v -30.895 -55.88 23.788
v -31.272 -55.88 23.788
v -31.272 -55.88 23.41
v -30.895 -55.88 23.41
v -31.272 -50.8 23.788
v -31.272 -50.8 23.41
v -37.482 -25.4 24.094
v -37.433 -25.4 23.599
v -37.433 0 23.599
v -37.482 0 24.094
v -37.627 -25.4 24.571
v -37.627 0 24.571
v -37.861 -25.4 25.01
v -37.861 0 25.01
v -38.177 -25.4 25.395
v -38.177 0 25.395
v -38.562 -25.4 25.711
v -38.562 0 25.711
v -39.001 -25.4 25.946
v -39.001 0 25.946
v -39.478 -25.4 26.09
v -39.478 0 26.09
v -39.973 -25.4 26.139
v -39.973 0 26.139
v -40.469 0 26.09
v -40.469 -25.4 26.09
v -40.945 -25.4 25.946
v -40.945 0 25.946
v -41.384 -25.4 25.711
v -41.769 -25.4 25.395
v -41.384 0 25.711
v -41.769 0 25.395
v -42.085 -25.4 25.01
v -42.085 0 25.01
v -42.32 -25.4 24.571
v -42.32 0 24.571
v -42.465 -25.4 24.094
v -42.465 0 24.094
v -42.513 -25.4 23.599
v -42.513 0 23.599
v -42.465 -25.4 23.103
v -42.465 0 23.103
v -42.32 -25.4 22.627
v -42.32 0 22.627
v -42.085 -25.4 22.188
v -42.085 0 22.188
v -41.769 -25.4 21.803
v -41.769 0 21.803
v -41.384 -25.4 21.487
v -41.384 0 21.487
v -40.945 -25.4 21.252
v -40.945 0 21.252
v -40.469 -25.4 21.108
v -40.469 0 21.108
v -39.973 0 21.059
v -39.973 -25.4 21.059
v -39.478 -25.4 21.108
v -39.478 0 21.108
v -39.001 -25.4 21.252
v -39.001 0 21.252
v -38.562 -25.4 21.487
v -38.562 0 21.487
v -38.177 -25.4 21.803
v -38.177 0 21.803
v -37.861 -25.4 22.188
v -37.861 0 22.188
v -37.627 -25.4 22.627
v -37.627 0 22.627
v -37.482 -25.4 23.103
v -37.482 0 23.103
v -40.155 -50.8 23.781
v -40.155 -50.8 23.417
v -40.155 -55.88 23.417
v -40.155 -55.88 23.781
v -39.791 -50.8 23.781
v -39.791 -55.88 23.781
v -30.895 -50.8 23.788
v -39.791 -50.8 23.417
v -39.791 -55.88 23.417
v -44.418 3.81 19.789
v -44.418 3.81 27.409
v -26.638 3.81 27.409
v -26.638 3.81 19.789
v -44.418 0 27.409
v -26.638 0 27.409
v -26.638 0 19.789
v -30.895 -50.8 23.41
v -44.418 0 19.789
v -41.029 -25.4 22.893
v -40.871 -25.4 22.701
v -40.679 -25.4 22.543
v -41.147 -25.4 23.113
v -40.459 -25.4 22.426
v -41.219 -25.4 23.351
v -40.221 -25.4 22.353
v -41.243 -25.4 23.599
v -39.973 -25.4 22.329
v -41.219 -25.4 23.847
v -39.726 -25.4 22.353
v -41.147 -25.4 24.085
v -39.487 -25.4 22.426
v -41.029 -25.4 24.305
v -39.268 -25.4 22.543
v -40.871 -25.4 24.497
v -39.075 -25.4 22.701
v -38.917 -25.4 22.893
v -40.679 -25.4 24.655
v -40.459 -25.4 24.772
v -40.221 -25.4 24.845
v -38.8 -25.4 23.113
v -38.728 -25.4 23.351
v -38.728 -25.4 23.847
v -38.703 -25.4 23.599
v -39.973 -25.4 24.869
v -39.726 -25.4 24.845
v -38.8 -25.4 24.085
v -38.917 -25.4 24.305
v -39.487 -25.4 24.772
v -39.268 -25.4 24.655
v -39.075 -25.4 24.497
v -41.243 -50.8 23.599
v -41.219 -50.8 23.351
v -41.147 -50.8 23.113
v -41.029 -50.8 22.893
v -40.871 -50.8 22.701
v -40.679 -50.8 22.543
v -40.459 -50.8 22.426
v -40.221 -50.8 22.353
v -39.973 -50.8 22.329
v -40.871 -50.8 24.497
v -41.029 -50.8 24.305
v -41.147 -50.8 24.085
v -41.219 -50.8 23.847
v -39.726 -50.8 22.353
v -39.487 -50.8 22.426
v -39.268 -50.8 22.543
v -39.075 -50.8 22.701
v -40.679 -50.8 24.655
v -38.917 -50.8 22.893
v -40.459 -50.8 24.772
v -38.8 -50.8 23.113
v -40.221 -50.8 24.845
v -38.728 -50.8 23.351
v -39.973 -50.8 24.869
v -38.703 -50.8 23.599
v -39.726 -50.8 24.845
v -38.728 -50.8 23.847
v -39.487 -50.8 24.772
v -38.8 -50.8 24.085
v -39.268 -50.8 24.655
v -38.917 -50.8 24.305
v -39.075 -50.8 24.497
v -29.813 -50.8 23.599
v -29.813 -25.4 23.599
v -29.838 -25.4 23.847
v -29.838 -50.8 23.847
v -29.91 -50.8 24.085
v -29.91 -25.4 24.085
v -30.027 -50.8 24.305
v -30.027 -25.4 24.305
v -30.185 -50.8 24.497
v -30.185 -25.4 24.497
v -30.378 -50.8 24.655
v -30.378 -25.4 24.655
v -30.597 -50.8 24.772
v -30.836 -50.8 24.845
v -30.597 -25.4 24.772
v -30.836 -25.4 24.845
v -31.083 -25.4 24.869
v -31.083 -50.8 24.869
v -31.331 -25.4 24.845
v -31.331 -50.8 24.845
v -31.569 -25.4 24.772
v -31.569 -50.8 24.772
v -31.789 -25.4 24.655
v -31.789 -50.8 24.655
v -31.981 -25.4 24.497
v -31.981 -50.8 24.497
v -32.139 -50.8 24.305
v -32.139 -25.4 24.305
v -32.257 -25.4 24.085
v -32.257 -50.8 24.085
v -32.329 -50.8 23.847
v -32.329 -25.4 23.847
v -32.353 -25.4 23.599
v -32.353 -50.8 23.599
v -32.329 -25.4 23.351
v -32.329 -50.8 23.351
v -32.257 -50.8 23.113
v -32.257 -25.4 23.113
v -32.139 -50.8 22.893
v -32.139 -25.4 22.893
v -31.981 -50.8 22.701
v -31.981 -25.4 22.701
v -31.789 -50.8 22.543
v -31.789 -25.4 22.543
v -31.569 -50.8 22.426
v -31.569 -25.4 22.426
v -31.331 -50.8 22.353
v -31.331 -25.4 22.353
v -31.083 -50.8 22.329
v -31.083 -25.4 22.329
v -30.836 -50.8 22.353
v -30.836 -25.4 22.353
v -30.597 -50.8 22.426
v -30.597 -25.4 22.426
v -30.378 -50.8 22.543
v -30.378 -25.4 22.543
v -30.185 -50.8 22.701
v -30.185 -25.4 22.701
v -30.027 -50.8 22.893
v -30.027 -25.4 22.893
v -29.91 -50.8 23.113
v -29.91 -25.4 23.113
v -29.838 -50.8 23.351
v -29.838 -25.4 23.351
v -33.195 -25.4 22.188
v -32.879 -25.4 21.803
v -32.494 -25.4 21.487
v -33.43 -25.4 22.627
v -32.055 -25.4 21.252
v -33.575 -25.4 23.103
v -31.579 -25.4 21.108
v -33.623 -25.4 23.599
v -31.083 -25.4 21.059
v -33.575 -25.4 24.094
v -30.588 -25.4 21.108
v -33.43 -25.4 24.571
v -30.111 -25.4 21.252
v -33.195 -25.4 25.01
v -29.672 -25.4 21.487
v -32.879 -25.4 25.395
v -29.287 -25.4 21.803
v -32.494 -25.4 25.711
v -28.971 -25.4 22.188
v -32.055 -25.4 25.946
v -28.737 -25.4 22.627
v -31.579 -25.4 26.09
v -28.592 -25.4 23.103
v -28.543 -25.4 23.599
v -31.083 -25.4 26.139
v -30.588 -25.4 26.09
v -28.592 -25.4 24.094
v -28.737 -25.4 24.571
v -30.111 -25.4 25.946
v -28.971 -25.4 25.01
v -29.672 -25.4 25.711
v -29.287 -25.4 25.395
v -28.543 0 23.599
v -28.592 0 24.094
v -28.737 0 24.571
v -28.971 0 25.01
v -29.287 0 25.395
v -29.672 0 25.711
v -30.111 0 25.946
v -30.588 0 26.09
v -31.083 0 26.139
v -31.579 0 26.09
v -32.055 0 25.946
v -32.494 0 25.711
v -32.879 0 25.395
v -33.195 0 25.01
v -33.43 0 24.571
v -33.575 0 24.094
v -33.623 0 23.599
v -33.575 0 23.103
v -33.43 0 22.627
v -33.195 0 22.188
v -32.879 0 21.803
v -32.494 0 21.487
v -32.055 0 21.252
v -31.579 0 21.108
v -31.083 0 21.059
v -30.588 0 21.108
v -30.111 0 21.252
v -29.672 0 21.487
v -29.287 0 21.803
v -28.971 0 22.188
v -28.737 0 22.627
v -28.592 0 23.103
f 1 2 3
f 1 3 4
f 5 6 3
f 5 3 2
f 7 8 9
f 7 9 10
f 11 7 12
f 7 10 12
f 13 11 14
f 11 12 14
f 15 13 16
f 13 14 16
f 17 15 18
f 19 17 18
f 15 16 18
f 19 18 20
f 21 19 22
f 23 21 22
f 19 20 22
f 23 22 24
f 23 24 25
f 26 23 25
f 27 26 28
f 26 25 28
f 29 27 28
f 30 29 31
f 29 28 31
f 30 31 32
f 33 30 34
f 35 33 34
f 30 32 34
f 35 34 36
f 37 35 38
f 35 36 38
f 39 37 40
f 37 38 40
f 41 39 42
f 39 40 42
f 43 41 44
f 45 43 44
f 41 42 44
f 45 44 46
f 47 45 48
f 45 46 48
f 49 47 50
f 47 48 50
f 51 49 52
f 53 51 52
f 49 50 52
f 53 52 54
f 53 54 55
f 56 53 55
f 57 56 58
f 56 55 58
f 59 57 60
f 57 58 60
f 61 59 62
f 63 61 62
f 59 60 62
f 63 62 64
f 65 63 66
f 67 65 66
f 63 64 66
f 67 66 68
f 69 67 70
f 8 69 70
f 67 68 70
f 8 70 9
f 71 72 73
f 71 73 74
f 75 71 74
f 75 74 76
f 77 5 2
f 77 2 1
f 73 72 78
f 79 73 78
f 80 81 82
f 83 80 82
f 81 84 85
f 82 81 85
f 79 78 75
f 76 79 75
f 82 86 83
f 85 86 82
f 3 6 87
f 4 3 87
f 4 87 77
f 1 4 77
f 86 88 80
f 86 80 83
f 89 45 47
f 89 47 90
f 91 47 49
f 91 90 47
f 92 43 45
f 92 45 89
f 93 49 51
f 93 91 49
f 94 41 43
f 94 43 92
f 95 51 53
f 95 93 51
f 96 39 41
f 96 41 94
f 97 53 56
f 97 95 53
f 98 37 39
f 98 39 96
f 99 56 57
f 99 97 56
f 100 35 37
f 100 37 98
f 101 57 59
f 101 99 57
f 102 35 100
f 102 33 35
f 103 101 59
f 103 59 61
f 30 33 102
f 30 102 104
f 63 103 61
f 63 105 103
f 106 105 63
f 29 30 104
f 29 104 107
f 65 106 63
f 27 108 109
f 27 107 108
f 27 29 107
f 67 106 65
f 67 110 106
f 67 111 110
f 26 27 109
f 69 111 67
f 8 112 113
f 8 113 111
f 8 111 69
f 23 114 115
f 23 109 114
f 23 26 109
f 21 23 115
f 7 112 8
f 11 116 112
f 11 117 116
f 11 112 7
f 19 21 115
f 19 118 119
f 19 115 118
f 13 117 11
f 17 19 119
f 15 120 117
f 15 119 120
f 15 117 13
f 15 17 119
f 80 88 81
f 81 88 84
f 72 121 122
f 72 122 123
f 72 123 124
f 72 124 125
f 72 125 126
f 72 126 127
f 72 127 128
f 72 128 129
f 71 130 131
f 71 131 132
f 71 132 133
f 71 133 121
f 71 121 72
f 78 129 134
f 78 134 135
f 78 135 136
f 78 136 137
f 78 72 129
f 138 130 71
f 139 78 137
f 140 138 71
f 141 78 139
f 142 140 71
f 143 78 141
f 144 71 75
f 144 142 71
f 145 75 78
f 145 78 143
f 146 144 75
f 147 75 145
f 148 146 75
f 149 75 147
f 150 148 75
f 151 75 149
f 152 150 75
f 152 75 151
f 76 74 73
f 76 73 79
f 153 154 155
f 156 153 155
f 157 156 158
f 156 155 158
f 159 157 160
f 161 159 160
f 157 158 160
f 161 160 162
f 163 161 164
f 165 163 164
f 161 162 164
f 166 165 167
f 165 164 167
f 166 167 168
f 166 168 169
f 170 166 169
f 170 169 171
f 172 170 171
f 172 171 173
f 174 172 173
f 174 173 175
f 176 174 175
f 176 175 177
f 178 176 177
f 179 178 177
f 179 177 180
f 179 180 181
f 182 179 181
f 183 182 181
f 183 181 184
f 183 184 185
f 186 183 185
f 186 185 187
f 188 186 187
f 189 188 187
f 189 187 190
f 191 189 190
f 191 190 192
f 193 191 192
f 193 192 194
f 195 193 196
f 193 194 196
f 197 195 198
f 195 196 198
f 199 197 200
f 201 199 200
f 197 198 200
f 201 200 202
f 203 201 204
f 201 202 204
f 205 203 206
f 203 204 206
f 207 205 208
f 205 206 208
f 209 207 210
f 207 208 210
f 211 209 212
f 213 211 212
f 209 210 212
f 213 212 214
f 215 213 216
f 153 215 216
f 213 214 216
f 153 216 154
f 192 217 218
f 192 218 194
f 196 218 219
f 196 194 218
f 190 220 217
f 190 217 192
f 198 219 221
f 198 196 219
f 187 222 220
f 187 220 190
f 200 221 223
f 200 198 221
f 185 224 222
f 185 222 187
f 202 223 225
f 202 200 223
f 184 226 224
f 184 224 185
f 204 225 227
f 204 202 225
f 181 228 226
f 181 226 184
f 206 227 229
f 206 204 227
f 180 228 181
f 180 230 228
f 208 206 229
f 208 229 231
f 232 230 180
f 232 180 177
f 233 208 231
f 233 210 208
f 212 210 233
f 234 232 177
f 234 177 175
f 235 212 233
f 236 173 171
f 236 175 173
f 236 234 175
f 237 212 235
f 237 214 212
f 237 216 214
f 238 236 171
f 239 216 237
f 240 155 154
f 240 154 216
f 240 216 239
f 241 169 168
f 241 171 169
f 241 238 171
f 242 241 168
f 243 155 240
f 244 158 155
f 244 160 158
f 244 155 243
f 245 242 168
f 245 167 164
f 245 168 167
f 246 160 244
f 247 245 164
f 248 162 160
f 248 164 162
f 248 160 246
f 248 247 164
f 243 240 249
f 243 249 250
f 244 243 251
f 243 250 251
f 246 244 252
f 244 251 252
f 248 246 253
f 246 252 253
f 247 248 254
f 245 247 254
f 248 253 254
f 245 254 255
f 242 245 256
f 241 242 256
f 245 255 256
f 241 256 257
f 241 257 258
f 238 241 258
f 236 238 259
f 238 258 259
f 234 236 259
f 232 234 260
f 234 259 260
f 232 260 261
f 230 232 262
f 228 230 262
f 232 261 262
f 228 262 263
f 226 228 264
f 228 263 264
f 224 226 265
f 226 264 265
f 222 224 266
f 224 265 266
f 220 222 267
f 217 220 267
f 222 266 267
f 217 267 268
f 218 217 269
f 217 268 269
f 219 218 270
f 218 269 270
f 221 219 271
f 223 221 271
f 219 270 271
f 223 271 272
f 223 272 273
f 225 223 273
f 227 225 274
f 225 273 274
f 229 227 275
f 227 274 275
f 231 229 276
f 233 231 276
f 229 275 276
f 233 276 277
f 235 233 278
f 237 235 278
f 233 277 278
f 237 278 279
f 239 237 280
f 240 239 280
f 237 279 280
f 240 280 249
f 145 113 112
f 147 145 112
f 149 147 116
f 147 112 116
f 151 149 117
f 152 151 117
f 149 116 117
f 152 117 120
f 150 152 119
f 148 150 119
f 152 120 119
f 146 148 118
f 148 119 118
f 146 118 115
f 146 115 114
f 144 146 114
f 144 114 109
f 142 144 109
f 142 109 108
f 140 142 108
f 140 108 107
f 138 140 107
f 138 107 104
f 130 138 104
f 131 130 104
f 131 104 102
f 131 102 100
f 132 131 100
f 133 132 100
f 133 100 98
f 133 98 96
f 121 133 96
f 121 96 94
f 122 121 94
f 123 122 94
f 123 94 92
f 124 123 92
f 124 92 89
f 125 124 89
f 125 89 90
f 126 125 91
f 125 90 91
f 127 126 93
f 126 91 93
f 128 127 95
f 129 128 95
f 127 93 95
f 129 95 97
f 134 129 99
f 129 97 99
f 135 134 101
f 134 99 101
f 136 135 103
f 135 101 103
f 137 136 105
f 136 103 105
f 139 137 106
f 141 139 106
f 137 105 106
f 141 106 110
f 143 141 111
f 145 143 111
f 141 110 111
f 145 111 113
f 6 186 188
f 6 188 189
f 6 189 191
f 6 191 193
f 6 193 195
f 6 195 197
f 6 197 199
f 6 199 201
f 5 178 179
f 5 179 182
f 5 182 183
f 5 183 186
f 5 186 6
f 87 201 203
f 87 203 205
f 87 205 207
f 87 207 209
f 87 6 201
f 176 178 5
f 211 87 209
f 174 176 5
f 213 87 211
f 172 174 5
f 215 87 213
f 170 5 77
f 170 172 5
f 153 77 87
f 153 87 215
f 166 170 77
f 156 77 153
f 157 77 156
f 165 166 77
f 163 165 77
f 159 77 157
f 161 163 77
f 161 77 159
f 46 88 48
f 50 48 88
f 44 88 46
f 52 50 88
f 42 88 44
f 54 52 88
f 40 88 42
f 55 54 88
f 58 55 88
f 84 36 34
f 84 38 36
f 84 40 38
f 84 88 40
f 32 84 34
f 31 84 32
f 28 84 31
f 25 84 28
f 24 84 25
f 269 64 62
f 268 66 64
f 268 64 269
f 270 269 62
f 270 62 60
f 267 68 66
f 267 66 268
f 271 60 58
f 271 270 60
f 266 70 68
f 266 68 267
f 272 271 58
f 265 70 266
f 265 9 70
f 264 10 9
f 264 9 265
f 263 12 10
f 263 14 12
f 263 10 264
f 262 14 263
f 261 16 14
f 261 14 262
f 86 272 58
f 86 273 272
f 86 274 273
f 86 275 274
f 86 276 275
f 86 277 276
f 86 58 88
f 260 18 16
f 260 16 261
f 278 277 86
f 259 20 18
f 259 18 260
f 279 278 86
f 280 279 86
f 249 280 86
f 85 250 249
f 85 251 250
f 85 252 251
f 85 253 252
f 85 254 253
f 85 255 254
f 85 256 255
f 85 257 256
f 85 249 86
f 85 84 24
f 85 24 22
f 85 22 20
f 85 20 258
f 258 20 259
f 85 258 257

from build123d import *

# Parameters (mm, degrees)
F0_W     = 17.78
F0_H     = 7.62
F0_R     = 2.54
F0_R_2   = 1.27
F1_DEPTH = 3.81
F2_DEPTH = 50.8
F3_DEPTH = 25.4
F4_W     = 0.363861
F4_H     = 0.363861
F5_DEPTH = 5.08
F6_W     = 0.377071
F6_H     = 0.377071
F7_DEPTH = 5.08


with BuildPart() as f1:
    # F0 (on Front) → F1 (new body)
    with BuildSketch(Plane.XZ):
        with Locations((-35.528351, 23.59897)):
            Rectangle(F0_W, F0_H)
        with Locations((-39.973351, 23.59897)):
            Circle(F0_R, mode=Mode.SUBTRACT)
        with Locations((-31.083351, 23.59897)):
            Circle(F0_R, mode=Mode.SUBTRACT)
        with Locations((-39.973351, 23.59897)):
            Circle(F0_R)
        with Locations((-39.973351, 23.59897)):
            Circle(F0_R_2, mode=Mode.SUBTRACT)
        with Locations((-39.973351, 23.59897)):
            Circle(F0_R_2)
        with Locations((-31.083351, 23.59897)):
            Circle(F0_R)
        with Locations((-31.083351, 23.59897)):
            Circle(F0_R_2, mode=Mode.SUBTRACT)
        with Locations((-31.083351, 23.59897)):
            Circle(F0_R_2)
    extrude(amount=-F1_DEPTH)

    # F0 (on Front) → F2 (join)
    with BuildSketch(Plane.XZ):
        with Locations((-39.973351, 23.59897)):
            Circle(F0_R_2)
        with Locations((-31.083351, 23.59897)):
            Circle(F0_R_2)
    extrude(amount=F2_DEPTH)

    # F0 (on Front) → F3 (join)
    with BuildSketch(Plane.XZ):
        with Locations((-39.973351, 23.59897)):
            Circle(F0_R)
        with Locations((-39.973351, 23.59897)):
            Circle(F0_R_2, mode=Mode.SUBTRACT)
        with Locations((-31.083351, 23.59897)):
            Circle(F0_R)
        with Locations((-31.083351, 23.59897)):
            Circle(F0_R_2, mode=Mode.SUBTRACT)
    extrude(amount=F3_DEPTH)

    # F4 (on face) → F5 (join)
    with BuildSketch(Plane.XZ.offset(50.8)):
        with Locations((-39.97335, 23.598971)):
            Rectangle(F4_W, F4_H)
    extrude(amount=F5_DEPTH)

    # F6 (on face) → F7 (join)
    with BuildSketch(Plane.XZ.offset(50.8)):
        with Locations((-31.08335, 23.598971)):
            Rectangle(F6_W, F6_H)
    extrude(amount=F7_DEPTH)


solid = f1.part
